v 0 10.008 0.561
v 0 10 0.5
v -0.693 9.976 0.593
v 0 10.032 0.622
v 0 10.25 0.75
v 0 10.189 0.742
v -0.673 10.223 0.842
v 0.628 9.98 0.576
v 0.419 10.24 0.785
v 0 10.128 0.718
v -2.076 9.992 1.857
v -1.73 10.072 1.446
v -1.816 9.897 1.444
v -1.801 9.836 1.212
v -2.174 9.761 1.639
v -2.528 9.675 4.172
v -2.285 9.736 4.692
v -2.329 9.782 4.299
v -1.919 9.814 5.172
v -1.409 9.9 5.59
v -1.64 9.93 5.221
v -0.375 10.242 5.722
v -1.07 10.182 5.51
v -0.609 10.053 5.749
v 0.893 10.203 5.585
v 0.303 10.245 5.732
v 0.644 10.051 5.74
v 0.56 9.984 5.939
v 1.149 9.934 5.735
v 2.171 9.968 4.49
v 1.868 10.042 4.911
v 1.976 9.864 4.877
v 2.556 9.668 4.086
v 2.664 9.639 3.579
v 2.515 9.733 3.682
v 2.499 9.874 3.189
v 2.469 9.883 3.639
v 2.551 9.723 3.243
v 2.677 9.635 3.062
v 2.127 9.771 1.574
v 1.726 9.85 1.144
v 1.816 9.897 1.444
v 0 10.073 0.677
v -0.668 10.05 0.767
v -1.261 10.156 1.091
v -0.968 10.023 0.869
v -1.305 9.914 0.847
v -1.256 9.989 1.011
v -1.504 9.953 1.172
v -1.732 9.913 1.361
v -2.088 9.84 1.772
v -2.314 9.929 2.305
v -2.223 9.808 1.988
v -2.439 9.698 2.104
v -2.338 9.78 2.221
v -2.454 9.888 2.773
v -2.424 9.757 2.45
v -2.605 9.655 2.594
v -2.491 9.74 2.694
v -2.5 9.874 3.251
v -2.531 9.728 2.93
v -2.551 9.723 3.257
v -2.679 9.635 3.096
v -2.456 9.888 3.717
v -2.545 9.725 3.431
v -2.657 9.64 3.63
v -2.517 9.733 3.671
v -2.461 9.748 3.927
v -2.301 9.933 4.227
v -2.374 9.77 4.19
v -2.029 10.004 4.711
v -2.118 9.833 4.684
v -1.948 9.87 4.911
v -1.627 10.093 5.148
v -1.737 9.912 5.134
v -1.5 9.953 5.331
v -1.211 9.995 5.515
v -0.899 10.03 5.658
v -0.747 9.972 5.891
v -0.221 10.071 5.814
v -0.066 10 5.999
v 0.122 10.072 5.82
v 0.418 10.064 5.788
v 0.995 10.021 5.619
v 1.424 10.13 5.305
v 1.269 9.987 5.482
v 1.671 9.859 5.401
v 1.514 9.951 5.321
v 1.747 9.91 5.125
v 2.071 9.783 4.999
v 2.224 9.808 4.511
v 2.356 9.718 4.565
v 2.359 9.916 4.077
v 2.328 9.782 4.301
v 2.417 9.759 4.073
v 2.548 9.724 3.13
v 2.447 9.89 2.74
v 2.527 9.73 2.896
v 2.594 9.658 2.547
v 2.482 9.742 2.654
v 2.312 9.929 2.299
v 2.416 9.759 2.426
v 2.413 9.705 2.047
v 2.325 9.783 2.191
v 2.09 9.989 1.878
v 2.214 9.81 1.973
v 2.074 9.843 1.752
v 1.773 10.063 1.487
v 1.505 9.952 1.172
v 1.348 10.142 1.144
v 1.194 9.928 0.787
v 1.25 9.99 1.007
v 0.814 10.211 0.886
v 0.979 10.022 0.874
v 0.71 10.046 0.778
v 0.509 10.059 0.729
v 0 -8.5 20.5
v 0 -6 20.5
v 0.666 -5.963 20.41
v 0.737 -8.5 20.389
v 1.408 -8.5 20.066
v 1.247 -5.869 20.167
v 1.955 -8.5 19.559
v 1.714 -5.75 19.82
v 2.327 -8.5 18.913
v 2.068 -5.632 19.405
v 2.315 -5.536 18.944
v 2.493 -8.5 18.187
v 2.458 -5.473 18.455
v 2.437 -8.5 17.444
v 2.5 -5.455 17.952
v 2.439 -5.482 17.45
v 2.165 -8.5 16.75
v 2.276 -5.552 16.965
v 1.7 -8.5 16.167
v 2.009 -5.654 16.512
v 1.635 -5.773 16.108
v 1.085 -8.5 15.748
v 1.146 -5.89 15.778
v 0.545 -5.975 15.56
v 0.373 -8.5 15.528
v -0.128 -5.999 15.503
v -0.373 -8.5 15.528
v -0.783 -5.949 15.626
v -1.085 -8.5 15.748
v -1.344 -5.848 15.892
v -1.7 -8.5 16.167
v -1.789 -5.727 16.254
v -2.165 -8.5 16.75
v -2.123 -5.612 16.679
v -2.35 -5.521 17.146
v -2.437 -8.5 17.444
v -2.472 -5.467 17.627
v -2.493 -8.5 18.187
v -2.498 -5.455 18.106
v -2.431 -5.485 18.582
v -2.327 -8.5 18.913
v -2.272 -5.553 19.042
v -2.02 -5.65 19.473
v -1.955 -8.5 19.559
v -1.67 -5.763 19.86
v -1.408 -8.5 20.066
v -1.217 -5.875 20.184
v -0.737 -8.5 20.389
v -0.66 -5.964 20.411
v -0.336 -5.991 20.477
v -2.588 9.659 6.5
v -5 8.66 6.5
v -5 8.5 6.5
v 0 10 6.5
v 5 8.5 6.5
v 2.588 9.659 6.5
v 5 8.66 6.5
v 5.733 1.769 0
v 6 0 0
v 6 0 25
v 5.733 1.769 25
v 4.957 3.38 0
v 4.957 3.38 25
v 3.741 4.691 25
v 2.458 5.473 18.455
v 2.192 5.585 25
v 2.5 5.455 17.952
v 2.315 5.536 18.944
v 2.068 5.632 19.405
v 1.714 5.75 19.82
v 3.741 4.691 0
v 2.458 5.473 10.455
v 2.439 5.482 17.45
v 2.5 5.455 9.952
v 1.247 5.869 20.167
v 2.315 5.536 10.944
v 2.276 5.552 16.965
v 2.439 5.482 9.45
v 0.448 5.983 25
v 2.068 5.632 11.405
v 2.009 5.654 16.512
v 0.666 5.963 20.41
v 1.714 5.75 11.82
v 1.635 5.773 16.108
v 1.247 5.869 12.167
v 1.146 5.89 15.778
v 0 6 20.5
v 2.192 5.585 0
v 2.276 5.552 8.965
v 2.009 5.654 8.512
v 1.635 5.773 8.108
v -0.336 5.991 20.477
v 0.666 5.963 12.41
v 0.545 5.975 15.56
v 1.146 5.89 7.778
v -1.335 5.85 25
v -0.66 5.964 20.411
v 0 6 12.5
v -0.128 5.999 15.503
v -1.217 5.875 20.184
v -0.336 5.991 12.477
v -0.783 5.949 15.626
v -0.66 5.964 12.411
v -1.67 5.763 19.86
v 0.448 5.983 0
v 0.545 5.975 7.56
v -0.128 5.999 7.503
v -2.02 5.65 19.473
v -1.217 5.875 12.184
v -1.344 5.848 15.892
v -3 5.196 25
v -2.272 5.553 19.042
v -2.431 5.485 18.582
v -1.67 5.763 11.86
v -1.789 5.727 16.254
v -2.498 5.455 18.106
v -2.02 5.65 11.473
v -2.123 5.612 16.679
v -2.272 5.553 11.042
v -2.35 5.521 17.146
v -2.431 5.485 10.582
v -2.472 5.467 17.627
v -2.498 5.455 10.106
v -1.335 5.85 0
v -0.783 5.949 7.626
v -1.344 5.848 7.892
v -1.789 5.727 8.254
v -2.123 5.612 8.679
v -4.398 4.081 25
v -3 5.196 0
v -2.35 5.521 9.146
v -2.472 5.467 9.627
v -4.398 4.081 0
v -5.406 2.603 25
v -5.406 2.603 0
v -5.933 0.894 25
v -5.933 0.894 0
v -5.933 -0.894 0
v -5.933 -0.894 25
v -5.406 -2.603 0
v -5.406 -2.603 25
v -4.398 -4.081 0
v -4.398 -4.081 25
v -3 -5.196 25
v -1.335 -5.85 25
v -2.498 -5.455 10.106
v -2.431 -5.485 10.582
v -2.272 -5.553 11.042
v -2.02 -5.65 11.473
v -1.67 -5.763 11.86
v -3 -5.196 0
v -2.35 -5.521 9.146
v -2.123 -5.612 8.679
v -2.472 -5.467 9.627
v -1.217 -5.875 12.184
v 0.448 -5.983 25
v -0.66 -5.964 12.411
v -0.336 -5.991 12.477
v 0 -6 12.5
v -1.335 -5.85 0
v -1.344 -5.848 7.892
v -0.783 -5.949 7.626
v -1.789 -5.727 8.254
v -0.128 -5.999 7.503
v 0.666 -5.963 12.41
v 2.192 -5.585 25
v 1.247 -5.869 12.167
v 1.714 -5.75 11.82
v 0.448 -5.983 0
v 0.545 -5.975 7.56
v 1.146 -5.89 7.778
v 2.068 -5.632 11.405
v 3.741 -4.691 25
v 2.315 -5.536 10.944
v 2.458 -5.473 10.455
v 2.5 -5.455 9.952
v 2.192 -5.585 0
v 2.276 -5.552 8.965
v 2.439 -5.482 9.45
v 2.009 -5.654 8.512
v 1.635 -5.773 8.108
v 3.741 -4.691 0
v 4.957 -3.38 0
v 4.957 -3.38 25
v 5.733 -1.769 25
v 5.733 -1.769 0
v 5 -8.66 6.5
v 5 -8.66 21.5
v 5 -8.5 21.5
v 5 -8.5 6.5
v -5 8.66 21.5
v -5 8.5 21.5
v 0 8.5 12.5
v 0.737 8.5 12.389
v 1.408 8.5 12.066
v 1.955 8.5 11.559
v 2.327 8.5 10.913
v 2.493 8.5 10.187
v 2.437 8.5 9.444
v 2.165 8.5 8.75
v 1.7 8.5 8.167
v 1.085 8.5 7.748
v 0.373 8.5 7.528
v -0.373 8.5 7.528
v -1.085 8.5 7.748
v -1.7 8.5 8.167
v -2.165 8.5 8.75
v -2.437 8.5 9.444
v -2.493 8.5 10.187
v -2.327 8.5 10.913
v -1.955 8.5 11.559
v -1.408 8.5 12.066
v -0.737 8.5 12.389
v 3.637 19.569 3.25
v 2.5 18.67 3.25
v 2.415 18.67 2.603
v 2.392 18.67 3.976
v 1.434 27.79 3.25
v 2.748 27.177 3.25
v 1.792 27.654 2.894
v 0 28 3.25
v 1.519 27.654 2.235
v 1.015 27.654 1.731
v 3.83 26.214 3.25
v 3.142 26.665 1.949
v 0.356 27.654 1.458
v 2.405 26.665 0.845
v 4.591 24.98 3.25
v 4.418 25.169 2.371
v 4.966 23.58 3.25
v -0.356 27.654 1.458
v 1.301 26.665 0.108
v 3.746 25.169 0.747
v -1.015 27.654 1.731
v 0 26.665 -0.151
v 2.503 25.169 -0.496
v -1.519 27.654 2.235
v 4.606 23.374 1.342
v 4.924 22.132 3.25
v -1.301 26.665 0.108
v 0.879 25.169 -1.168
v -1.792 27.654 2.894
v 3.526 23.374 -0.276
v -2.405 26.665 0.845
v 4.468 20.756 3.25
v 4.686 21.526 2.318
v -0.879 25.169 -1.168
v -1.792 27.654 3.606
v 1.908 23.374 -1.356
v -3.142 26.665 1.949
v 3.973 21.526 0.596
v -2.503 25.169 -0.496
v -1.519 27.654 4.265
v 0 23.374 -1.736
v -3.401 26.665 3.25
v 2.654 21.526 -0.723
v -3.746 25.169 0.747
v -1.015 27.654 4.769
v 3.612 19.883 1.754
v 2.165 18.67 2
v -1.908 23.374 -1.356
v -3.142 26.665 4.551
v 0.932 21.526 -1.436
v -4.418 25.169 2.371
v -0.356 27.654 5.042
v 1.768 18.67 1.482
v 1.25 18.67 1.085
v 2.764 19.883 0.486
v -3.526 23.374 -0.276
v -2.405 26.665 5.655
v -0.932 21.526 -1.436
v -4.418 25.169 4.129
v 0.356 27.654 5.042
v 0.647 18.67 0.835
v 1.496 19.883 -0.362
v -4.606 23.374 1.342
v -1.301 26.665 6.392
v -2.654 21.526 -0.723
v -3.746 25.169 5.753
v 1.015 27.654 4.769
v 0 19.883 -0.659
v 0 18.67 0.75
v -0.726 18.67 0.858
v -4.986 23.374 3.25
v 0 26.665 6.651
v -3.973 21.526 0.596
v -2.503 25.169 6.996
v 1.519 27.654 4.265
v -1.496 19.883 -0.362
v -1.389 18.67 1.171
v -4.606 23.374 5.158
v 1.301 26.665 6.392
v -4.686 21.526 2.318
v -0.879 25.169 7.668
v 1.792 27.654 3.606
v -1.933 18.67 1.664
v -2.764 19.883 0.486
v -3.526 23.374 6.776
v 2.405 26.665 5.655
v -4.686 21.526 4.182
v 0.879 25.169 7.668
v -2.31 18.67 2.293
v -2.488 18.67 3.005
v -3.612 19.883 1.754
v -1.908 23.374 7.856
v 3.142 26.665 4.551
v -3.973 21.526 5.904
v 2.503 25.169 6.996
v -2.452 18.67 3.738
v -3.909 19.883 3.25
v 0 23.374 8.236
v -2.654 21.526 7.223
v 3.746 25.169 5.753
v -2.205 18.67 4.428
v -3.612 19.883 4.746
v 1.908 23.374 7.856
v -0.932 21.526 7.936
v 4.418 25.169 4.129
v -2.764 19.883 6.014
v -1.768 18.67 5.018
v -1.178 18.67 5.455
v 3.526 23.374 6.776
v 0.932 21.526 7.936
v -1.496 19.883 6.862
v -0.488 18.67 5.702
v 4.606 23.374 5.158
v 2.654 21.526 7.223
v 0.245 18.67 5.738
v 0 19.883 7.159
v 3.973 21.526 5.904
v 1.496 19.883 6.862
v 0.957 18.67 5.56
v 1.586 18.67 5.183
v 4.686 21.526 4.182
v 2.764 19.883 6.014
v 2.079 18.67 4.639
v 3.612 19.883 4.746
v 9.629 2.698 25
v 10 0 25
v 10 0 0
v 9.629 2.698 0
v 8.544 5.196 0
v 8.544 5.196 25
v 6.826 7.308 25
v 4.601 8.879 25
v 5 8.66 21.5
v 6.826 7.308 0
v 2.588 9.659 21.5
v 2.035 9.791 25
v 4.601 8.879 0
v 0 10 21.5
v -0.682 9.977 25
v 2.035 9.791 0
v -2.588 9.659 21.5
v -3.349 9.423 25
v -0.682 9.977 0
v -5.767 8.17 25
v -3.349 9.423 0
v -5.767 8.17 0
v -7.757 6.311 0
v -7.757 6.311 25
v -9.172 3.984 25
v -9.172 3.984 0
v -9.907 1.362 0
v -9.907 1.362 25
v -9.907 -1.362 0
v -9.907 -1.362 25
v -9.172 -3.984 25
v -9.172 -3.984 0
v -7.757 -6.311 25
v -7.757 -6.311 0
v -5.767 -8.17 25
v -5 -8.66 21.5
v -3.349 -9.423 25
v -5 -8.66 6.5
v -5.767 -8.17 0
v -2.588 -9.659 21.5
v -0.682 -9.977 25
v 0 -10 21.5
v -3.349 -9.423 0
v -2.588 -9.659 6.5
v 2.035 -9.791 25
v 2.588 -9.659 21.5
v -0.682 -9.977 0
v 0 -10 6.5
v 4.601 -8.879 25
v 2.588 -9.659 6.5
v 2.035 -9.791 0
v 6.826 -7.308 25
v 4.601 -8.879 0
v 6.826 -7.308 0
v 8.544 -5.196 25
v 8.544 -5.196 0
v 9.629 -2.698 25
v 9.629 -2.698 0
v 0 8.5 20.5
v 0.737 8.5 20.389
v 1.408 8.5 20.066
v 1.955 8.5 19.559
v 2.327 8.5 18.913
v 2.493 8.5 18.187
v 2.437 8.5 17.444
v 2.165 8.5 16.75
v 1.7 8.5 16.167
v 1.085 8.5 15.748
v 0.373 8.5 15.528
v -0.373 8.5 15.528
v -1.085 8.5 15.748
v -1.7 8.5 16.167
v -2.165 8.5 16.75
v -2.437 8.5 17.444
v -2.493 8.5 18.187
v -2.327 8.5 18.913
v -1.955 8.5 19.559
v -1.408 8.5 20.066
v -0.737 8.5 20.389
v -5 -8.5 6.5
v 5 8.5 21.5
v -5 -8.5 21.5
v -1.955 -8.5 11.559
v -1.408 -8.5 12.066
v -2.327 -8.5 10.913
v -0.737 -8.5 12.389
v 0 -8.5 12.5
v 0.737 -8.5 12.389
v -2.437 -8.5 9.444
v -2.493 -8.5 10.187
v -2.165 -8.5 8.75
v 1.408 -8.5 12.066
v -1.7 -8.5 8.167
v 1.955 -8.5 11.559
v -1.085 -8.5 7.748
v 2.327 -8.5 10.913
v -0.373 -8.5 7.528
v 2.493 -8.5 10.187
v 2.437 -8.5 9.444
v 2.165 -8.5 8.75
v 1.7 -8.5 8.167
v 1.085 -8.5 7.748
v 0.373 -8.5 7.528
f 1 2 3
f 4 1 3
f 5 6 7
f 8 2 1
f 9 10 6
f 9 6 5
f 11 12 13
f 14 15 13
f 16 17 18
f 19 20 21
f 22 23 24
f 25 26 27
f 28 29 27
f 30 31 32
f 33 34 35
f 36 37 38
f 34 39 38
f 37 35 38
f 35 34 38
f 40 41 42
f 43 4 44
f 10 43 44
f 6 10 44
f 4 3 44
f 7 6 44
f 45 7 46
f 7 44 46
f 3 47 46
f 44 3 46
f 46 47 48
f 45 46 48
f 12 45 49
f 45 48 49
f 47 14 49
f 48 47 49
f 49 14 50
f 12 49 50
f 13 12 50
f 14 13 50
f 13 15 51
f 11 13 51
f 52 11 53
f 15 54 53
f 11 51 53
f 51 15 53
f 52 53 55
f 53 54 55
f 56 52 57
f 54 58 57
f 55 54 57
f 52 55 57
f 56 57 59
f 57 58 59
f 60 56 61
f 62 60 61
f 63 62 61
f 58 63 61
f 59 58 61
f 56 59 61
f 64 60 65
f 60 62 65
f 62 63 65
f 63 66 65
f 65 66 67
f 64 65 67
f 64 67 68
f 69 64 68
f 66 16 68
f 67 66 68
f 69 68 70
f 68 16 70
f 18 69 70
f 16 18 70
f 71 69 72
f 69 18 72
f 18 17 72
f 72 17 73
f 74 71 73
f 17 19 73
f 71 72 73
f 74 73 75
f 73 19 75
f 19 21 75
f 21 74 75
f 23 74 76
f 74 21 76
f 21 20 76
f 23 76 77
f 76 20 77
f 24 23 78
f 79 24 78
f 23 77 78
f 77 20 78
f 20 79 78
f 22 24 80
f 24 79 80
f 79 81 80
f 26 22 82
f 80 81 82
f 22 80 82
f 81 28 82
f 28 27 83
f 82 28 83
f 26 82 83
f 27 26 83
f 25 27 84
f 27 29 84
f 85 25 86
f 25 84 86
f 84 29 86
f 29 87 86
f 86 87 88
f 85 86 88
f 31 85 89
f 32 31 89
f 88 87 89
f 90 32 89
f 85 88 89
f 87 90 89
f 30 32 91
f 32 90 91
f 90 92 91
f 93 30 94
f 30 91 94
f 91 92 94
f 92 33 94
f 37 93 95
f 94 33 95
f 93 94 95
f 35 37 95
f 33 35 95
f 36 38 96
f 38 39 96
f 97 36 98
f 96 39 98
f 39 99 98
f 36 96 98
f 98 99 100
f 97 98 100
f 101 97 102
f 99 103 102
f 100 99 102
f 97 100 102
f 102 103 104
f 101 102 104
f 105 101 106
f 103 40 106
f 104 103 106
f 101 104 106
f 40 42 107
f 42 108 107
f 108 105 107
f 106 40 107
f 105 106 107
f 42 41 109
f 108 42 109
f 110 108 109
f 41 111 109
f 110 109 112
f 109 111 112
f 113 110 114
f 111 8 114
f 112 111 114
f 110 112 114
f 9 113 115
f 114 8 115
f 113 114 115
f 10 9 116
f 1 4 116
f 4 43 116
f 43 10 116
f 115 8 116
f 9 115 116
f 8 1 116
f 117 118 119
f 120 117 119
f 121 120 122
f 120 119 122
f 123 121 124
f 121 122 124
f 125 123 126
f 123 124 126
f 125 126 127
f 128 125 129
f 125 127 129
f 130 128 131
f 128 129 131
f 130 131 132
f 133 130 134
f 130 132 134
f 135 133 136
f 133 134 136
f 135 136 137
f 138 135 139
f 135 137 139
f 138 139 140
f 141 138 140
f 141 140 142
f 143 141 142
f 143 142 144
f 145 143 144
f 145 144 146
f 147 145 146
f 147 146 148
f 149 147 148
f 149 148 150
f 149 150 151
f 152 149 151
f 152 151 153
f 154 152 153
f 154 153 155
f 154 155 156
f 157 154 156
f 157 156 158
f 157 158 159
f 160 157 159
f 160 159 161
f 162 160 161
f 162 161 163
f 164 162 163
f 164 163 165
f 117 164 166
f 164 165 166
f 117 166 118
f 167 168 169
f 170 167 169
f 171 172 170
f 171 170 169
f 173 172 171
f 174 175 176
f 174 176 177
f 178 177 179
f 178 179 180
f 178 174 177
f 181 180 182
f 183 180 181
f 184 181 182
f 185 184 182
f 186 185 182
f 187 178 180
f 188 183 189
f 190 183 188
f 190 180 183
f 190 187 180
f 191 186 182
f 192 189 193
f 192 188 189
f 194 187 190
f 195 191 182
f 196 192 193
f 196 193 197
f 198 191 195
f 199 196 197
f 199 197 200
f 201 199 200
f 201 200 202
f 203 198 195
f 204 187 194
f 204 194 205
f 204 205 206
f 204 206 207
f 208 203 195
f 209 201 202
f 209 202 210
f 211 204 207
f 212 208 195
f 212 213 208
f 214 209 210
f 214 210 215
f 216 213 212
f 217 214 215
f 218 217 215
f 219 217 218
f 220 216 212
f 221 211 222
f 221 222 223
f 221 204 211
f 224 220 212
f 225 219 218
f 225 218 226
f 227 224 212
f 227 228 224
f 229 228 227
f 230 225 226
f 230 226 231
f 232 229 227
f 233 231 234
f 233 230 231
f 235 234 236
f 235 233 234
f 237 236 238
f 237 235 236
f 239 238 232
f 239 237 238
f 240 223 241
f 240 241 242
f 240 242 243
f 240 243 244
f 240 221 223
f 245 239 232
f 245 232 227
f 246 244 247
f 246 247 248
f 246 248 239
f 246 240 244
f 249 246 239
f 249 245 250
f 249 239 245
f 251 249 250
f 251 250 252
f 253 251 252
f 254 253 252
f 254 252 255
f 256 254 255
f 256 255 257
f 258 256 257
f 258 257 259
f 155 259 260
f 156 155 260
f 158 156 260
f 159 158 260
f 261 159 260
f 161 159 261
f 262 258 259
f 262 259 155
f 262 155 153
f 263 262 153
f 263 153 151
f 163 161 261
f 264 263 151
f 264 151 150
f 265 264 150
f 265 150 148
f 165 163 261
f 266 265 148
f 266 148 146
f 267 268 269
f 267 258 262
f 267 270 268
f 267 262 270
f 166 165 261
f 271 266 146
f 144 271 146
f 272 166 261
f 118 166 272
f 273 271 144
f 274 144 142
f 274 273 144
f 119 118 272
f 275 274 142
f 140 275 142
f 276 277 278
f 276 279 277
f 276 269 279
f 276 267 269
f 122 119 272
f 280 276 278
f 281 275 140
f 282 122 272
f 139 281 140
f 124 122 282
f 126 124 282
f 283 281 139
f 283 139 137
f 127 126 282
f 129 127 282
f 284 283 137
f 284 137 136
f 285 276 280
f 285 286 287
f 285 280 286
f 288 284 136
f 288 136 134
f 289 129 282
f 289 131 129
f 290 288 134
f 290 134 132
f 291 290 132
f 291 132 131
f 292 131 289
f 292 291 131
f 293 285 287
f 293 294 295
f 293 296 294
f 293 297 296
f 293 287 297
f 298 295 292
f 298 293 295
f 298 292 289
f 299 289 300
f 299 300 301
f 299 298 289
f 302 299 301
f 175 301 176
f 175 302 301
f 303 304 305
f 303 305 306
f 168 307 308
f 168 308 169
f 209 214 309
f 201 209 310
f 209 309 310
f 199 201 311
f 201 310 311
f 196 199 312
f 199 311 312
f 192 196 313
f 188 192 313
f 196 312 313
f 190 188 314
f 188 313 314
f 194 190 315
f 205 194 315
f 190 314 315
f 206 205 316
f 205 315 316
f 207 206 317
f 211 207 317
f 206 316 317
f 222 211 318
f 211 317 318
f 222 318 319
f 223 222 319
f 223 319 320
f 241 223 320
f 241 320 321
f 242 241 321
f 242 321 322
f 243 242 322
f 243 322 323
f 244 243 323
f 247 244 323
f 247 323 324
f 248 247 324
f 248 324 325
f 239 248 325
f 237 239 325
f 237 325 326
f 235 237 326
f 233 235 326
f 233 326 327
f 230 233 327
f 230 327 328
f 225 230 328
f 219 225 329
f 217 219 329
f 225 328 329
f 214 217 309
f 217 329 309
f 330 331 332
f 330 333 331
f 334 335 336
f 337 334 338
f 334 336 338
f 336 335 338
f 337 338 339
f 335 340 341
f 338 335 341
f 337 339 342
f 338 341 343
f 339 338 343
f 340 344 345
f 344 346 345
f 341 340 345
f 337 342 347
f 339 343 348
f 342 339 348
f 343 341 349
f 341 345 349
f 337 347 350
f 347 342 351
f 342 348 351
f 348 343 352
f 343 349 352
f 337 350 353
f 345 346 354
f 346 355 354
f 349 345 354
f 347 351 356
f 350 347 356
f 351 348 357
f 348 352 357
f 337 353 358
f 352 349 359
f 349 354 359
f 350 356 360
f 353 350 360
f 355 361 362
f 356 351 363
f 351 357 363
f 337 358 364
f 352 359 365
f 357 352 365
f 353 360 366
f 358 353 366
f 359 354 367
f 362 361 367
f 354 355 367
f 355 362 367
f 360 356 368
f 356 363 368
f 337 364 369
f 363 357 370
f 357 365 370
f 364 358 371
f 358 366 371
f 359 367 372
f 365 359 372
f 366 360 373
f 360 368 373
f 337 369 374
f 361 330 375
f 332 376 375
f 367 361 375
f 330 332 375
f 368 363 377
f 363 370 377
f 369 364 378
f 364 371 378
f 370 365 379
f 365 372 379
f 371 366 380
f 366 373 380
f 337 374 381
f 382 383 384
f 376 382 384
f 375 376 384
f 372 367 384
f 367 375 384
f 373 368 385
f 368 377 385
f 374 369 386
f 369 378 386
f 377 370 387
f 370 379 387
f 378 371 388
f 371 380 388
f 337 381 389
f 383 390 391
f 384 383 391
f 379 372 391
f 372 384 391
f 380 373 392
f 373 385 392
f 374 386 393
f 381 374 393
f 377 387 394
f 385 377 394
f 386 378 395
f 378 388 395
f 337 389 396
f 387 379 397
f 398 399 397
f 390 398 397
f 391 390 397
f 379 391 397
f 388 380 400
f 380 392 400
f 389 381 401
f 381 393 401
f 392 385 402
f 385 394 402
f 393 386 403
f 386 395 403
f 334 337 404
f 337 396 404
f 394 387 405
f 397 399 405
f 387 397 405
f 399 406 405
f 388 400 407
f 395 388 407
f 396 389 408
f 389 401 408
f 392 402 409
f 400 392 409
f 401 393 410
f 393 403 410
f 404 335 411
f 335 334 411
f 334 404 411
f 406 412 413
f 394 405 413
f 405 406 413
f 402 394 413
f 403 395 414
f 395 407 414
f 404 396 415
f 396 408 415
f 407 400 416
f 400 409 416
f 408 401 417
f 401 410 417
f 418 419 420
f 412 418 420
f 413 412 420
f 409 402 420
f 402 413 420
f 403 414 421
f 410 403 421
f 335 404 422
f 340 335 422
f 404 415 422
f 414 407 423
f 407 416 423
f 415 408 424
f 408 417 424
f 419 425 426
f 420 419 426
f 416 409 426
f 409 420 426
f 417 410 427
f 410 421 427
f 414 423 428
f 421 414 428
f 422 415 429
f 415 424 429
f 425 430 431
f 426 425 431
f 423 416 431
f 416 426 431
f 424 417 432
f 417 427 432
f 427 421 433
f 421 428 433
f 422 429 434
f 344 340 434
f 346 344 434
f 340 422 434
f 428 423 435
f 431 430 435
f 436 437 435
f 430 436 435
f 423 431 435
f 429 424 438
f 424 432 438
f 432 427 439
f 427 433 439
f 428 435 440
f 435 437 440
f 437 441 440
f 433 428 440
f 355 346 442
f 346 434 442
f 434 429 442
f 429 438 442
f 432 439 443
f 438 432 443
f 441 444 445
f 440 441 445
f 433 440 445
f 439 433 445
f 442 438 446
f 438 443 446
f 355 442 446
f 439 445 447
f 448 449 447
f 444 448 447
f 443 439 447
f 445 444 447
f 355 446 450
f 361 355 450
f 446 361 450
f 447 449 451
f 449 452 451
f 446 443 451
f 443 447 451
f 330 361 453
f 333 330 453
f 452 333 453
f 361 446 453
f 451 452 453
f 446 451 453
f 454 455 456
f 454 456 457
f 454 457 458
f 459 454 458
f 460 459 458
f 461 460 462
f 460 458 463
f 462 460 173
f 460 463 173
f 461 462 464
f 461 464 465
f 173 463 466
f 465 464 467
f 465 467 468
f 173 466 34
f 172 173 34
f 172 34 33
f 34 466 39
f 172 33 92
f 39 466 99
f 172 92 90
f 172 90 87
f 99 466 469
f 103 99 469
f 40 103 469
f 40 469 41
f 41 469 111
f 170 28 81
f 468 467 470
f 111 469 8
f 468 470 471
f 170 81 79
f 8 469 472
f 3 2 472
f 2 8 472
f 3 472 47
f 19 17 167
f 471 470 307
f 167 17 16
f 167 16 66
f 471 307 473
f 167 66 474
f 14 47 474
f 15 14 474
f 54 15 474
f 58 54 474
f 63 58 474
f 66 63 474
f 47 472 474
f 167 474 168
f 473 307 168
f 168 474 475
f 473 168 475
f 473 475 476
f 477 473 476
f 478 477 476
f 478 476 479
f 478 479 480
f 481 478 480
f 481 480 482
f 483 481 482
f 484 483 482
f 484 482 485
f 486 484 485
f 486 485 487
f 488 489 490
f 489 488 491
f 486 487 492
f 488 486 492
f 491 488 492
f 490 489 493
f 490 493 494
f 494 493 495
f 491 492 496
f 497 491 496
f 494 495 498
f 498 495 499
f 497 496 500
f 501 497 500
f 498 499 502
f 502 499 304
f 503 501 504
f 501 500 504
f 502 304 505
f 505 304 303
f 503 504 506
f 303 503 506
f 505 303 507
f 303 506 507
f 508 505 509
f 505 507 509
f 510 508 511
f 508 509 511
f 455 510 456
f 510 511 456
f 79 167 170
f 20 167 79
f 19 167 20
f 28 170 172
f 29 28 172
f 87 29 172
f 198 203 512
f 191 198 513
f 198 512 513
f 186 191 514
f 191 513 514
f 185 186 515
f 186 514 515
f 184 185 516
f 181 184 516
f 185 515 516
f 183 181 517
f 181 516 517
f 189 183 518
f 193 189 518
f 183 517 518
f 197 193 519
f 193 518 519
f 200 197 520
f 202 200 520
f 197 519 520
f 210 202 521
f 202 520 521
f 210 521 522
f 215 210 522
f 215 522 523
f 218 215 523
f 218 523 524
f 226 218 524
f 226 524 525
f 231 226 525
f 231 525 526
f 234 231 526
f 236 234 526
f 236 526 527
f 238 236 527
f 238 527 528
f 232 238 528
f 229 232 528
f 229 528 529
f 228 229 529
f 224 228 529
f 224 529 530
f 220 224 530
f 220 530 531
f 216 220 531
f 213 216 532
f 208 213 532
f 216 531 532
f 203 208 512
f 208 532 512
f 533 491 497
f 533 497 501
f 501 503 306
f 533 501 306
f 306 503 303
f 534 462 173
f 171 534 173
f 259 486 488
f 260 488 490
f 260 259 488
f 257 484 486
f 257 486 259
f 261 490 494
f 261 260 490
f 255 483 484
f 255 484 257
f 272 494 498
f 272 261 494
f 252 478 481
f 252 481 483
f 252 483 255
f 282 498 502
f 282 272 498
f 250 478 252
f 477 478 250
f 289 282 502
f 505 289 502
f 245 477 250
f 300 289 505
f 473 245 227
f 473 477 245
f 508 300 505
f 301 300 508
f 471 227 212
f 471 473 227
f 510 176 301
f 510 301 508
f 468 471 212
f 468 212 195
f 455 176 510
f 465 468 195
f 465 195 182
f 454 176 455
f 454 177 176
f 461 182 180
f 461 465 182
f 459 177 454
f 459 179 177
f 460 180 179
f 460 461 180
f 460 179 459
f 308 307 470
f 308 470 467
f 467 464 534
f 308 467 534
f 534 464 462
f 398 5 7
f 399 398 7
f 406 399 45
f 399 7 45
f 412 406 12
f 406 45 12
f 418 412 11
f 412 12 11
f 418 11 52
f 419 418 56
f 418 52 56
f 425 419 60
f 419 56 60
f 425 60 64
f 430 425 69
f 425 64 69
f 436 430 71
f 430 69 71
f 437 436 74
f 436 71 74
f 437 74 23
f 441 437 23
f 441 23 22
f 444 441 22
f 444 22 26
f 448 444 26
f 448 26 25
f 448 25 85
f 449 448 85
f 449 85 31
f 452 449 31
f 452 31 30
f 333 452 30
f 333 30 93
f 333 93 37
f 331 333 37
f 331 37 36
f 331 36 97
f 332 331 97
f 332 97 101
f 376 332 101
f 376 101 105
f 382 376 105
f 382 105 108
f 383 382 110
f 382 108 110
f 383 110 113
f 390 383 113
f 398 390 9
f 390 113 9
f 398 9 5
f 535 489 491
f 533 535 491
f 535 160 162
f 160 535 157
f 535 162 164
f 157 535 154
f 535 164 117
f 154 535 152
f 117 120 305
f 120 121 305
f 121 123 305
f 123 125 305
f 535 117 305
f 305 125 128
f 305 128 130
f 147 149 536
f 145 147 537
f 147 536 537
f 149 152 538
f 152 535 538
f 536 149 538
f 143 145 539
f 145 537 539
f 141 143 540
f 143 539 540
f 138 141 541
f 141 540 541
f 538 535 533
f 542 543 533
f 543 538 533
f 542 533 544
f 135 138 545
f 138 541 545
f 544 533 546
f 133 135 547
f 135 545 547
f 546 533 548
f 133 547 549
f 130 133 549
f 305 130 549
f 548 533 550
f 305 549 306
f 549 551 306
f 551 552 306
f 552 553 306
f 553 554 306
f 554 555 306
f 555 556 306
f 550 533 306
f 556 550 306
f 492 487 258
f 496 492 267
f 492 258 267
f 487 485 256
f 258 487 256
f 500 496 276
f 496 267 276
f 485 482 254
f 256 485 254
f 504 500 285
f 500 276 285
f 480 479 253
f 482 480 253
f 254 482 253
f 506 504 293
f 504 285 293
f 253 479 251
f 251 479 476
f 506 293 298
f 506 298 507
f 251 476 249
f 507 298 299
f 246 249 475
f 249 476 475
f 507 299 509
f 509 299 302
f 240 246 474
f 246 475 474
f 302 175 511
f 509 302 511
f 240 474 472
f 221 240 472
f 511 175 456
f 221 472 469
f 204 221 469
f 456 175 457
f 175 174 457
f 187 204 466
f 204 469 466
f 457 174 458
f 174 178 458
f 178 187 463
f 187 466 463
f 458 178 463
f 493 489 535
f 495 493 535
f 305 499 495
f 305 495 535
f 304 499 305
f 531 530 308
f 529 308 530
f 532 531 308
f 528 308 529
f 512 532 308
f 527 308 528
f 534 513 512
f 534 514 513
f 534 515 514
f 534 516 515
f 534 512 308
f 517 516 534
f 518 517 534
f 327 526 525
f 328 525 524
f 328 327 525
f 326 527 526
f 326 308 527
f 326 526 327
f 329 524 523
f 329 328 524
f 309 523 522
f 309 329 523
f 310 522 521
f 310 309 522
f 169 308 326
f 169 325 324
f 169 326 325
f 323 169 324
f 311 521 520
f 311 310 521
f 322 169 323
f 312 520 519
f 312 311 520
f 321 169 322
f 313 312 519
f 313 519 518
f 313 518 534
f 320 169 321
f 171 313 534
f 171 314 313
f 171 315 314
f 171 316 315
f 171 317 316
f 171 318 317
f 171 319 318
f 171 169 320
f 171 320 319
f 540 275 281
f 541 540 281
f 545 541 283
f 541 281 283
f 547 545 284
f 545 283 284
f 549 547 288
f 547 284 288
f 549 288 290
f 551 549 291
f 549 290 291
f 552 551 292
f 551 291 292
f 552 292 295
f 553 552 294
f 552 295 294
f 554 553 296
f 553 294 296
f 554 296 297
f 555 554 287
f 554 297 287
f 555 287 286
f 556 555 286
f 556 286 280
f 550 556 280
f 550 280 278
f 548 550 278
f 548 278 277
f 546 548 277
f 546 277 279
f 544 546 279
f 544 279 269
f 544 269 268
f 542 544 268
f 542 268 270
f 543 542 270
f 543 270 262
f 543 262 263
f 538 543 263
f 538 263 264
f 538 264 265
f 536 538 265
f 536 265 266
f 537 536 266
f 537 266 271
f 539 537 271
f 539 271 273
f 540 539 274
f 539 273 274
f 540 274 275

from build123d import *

# Parameters (mm, degrees)
SKETCH1_R           = 10
SKETCH1_R_2         = 6
BOSS_EXTRUDE1_DEPTH = 25
BOSS_EXTRUDE2_START = -0.317539
SKETCH2_R           = 2.5
BOSS_EXTRUDE2_DEPTH = 10.317539
FILLET1_R           = 0.25
SKETCH5_R           = 2.5
CUT_EXTRUDE1_DEPTH  = 34.541019826
SKETCH6_W           = 10
SKETCH6_H           = 15
CUT_EXTRUDE3_DEPTH  = 1.5


with BuildPart() as part:
    # Sketch1 → Boss-Extrude1 (new body)
    with BuildSketch(Plane.XY):
        Circle(SKETCH1_R)
        Circle(SKETCH1_R_2, mode=Mode.SUBTRACT)
    extrude(amount=BOSS_EXTRUDE1_DEPTH)


with BuildPart() as boss_extrude2_tool:
    # Sketch2 → Boss-Extrude2 (new body)
    with BuildSketch(Plane(origin=(0, 10, 0), x_dir=(1, 0, 0), z_dir=(0, 1, 0)).offset(BOSS_EXTRUDE2_START)):
        with Locations(Location((0, -3.25, 0), (0, 0, 90))):
            Circle(SKETCH2_R)
    extrude(amount=BOSS_EXTRUDE2_DEPTH)


with BuildPart() as part_1:
    add(part.part)


with BuildPart() as part_2:
    # Boss-Extrude2: joined with boss_extrude2_tool
    add(part_1.part.fuse(boss_extrude2_tool.part, tol=0.00001))

    # Fillet1
    fillet1_edges = [part_2.edges().sort_by_distance(p)[0] for p in [
        (-2e-09, 9.999999993, 5.750000022),
    ]]
    fillet(fillet1_edges, radius=FILLET1_R)

    # Sketch5 → Cut-Extrude1 (cut, through all)
    with BuildSketch(Plane(origin=(0, 10, 0), x_dir=(1, 0, 0), z_dir=(0, 1, 0))):
        with Locations(Location((0, -10, 0), (0, 0, 270))):
            Circle(SKETCH5_R)
        with Locations(Location((0, -18, 0), (0, 0, 270))):
            Circle(SKETCH5_R)
    extrude(amount=-CUT_EXTRUDE1_DEPTH, mode=Mode.SUBTRACT)

    # Sketch6 → Cut-Extrude3 (cut)
    with BuildSketch(Plane(origin=(0, 10, 0), x_dir=(1, 0, 0), z_dir=(0, 1, 0))):
        with Locations((0, -14)):
            Rectangle(SKETCH6_W, SKETCH6_H)
    cut_extrude3 = extrude(amount=-CUT_EXTRUDE3_DEPTH, mode=Mode.SUBTRACT)

    # Mirror1: Cut-Extrude3 across plane
    add(cut_extrude3.mirror(Plane.ZX), mode=Mode.SUBTRACT)

    # Sketch4 → Revolve1 (revolve)
    with BuildSketch(Plane(origin=(0, 0, 3.25), x_dir=(-1, 0, 0), z_dir=(0, 0, -1))):
        with BuildLine():
            Line((0, 18), (0, 28))
            ThreePointArc((0, 28), (-5, 23), (0, 18))
        make_face()
    revolve(axis=Axis((0, 18, 3.25), (0, 1, 0)))


solid = part_2.part
